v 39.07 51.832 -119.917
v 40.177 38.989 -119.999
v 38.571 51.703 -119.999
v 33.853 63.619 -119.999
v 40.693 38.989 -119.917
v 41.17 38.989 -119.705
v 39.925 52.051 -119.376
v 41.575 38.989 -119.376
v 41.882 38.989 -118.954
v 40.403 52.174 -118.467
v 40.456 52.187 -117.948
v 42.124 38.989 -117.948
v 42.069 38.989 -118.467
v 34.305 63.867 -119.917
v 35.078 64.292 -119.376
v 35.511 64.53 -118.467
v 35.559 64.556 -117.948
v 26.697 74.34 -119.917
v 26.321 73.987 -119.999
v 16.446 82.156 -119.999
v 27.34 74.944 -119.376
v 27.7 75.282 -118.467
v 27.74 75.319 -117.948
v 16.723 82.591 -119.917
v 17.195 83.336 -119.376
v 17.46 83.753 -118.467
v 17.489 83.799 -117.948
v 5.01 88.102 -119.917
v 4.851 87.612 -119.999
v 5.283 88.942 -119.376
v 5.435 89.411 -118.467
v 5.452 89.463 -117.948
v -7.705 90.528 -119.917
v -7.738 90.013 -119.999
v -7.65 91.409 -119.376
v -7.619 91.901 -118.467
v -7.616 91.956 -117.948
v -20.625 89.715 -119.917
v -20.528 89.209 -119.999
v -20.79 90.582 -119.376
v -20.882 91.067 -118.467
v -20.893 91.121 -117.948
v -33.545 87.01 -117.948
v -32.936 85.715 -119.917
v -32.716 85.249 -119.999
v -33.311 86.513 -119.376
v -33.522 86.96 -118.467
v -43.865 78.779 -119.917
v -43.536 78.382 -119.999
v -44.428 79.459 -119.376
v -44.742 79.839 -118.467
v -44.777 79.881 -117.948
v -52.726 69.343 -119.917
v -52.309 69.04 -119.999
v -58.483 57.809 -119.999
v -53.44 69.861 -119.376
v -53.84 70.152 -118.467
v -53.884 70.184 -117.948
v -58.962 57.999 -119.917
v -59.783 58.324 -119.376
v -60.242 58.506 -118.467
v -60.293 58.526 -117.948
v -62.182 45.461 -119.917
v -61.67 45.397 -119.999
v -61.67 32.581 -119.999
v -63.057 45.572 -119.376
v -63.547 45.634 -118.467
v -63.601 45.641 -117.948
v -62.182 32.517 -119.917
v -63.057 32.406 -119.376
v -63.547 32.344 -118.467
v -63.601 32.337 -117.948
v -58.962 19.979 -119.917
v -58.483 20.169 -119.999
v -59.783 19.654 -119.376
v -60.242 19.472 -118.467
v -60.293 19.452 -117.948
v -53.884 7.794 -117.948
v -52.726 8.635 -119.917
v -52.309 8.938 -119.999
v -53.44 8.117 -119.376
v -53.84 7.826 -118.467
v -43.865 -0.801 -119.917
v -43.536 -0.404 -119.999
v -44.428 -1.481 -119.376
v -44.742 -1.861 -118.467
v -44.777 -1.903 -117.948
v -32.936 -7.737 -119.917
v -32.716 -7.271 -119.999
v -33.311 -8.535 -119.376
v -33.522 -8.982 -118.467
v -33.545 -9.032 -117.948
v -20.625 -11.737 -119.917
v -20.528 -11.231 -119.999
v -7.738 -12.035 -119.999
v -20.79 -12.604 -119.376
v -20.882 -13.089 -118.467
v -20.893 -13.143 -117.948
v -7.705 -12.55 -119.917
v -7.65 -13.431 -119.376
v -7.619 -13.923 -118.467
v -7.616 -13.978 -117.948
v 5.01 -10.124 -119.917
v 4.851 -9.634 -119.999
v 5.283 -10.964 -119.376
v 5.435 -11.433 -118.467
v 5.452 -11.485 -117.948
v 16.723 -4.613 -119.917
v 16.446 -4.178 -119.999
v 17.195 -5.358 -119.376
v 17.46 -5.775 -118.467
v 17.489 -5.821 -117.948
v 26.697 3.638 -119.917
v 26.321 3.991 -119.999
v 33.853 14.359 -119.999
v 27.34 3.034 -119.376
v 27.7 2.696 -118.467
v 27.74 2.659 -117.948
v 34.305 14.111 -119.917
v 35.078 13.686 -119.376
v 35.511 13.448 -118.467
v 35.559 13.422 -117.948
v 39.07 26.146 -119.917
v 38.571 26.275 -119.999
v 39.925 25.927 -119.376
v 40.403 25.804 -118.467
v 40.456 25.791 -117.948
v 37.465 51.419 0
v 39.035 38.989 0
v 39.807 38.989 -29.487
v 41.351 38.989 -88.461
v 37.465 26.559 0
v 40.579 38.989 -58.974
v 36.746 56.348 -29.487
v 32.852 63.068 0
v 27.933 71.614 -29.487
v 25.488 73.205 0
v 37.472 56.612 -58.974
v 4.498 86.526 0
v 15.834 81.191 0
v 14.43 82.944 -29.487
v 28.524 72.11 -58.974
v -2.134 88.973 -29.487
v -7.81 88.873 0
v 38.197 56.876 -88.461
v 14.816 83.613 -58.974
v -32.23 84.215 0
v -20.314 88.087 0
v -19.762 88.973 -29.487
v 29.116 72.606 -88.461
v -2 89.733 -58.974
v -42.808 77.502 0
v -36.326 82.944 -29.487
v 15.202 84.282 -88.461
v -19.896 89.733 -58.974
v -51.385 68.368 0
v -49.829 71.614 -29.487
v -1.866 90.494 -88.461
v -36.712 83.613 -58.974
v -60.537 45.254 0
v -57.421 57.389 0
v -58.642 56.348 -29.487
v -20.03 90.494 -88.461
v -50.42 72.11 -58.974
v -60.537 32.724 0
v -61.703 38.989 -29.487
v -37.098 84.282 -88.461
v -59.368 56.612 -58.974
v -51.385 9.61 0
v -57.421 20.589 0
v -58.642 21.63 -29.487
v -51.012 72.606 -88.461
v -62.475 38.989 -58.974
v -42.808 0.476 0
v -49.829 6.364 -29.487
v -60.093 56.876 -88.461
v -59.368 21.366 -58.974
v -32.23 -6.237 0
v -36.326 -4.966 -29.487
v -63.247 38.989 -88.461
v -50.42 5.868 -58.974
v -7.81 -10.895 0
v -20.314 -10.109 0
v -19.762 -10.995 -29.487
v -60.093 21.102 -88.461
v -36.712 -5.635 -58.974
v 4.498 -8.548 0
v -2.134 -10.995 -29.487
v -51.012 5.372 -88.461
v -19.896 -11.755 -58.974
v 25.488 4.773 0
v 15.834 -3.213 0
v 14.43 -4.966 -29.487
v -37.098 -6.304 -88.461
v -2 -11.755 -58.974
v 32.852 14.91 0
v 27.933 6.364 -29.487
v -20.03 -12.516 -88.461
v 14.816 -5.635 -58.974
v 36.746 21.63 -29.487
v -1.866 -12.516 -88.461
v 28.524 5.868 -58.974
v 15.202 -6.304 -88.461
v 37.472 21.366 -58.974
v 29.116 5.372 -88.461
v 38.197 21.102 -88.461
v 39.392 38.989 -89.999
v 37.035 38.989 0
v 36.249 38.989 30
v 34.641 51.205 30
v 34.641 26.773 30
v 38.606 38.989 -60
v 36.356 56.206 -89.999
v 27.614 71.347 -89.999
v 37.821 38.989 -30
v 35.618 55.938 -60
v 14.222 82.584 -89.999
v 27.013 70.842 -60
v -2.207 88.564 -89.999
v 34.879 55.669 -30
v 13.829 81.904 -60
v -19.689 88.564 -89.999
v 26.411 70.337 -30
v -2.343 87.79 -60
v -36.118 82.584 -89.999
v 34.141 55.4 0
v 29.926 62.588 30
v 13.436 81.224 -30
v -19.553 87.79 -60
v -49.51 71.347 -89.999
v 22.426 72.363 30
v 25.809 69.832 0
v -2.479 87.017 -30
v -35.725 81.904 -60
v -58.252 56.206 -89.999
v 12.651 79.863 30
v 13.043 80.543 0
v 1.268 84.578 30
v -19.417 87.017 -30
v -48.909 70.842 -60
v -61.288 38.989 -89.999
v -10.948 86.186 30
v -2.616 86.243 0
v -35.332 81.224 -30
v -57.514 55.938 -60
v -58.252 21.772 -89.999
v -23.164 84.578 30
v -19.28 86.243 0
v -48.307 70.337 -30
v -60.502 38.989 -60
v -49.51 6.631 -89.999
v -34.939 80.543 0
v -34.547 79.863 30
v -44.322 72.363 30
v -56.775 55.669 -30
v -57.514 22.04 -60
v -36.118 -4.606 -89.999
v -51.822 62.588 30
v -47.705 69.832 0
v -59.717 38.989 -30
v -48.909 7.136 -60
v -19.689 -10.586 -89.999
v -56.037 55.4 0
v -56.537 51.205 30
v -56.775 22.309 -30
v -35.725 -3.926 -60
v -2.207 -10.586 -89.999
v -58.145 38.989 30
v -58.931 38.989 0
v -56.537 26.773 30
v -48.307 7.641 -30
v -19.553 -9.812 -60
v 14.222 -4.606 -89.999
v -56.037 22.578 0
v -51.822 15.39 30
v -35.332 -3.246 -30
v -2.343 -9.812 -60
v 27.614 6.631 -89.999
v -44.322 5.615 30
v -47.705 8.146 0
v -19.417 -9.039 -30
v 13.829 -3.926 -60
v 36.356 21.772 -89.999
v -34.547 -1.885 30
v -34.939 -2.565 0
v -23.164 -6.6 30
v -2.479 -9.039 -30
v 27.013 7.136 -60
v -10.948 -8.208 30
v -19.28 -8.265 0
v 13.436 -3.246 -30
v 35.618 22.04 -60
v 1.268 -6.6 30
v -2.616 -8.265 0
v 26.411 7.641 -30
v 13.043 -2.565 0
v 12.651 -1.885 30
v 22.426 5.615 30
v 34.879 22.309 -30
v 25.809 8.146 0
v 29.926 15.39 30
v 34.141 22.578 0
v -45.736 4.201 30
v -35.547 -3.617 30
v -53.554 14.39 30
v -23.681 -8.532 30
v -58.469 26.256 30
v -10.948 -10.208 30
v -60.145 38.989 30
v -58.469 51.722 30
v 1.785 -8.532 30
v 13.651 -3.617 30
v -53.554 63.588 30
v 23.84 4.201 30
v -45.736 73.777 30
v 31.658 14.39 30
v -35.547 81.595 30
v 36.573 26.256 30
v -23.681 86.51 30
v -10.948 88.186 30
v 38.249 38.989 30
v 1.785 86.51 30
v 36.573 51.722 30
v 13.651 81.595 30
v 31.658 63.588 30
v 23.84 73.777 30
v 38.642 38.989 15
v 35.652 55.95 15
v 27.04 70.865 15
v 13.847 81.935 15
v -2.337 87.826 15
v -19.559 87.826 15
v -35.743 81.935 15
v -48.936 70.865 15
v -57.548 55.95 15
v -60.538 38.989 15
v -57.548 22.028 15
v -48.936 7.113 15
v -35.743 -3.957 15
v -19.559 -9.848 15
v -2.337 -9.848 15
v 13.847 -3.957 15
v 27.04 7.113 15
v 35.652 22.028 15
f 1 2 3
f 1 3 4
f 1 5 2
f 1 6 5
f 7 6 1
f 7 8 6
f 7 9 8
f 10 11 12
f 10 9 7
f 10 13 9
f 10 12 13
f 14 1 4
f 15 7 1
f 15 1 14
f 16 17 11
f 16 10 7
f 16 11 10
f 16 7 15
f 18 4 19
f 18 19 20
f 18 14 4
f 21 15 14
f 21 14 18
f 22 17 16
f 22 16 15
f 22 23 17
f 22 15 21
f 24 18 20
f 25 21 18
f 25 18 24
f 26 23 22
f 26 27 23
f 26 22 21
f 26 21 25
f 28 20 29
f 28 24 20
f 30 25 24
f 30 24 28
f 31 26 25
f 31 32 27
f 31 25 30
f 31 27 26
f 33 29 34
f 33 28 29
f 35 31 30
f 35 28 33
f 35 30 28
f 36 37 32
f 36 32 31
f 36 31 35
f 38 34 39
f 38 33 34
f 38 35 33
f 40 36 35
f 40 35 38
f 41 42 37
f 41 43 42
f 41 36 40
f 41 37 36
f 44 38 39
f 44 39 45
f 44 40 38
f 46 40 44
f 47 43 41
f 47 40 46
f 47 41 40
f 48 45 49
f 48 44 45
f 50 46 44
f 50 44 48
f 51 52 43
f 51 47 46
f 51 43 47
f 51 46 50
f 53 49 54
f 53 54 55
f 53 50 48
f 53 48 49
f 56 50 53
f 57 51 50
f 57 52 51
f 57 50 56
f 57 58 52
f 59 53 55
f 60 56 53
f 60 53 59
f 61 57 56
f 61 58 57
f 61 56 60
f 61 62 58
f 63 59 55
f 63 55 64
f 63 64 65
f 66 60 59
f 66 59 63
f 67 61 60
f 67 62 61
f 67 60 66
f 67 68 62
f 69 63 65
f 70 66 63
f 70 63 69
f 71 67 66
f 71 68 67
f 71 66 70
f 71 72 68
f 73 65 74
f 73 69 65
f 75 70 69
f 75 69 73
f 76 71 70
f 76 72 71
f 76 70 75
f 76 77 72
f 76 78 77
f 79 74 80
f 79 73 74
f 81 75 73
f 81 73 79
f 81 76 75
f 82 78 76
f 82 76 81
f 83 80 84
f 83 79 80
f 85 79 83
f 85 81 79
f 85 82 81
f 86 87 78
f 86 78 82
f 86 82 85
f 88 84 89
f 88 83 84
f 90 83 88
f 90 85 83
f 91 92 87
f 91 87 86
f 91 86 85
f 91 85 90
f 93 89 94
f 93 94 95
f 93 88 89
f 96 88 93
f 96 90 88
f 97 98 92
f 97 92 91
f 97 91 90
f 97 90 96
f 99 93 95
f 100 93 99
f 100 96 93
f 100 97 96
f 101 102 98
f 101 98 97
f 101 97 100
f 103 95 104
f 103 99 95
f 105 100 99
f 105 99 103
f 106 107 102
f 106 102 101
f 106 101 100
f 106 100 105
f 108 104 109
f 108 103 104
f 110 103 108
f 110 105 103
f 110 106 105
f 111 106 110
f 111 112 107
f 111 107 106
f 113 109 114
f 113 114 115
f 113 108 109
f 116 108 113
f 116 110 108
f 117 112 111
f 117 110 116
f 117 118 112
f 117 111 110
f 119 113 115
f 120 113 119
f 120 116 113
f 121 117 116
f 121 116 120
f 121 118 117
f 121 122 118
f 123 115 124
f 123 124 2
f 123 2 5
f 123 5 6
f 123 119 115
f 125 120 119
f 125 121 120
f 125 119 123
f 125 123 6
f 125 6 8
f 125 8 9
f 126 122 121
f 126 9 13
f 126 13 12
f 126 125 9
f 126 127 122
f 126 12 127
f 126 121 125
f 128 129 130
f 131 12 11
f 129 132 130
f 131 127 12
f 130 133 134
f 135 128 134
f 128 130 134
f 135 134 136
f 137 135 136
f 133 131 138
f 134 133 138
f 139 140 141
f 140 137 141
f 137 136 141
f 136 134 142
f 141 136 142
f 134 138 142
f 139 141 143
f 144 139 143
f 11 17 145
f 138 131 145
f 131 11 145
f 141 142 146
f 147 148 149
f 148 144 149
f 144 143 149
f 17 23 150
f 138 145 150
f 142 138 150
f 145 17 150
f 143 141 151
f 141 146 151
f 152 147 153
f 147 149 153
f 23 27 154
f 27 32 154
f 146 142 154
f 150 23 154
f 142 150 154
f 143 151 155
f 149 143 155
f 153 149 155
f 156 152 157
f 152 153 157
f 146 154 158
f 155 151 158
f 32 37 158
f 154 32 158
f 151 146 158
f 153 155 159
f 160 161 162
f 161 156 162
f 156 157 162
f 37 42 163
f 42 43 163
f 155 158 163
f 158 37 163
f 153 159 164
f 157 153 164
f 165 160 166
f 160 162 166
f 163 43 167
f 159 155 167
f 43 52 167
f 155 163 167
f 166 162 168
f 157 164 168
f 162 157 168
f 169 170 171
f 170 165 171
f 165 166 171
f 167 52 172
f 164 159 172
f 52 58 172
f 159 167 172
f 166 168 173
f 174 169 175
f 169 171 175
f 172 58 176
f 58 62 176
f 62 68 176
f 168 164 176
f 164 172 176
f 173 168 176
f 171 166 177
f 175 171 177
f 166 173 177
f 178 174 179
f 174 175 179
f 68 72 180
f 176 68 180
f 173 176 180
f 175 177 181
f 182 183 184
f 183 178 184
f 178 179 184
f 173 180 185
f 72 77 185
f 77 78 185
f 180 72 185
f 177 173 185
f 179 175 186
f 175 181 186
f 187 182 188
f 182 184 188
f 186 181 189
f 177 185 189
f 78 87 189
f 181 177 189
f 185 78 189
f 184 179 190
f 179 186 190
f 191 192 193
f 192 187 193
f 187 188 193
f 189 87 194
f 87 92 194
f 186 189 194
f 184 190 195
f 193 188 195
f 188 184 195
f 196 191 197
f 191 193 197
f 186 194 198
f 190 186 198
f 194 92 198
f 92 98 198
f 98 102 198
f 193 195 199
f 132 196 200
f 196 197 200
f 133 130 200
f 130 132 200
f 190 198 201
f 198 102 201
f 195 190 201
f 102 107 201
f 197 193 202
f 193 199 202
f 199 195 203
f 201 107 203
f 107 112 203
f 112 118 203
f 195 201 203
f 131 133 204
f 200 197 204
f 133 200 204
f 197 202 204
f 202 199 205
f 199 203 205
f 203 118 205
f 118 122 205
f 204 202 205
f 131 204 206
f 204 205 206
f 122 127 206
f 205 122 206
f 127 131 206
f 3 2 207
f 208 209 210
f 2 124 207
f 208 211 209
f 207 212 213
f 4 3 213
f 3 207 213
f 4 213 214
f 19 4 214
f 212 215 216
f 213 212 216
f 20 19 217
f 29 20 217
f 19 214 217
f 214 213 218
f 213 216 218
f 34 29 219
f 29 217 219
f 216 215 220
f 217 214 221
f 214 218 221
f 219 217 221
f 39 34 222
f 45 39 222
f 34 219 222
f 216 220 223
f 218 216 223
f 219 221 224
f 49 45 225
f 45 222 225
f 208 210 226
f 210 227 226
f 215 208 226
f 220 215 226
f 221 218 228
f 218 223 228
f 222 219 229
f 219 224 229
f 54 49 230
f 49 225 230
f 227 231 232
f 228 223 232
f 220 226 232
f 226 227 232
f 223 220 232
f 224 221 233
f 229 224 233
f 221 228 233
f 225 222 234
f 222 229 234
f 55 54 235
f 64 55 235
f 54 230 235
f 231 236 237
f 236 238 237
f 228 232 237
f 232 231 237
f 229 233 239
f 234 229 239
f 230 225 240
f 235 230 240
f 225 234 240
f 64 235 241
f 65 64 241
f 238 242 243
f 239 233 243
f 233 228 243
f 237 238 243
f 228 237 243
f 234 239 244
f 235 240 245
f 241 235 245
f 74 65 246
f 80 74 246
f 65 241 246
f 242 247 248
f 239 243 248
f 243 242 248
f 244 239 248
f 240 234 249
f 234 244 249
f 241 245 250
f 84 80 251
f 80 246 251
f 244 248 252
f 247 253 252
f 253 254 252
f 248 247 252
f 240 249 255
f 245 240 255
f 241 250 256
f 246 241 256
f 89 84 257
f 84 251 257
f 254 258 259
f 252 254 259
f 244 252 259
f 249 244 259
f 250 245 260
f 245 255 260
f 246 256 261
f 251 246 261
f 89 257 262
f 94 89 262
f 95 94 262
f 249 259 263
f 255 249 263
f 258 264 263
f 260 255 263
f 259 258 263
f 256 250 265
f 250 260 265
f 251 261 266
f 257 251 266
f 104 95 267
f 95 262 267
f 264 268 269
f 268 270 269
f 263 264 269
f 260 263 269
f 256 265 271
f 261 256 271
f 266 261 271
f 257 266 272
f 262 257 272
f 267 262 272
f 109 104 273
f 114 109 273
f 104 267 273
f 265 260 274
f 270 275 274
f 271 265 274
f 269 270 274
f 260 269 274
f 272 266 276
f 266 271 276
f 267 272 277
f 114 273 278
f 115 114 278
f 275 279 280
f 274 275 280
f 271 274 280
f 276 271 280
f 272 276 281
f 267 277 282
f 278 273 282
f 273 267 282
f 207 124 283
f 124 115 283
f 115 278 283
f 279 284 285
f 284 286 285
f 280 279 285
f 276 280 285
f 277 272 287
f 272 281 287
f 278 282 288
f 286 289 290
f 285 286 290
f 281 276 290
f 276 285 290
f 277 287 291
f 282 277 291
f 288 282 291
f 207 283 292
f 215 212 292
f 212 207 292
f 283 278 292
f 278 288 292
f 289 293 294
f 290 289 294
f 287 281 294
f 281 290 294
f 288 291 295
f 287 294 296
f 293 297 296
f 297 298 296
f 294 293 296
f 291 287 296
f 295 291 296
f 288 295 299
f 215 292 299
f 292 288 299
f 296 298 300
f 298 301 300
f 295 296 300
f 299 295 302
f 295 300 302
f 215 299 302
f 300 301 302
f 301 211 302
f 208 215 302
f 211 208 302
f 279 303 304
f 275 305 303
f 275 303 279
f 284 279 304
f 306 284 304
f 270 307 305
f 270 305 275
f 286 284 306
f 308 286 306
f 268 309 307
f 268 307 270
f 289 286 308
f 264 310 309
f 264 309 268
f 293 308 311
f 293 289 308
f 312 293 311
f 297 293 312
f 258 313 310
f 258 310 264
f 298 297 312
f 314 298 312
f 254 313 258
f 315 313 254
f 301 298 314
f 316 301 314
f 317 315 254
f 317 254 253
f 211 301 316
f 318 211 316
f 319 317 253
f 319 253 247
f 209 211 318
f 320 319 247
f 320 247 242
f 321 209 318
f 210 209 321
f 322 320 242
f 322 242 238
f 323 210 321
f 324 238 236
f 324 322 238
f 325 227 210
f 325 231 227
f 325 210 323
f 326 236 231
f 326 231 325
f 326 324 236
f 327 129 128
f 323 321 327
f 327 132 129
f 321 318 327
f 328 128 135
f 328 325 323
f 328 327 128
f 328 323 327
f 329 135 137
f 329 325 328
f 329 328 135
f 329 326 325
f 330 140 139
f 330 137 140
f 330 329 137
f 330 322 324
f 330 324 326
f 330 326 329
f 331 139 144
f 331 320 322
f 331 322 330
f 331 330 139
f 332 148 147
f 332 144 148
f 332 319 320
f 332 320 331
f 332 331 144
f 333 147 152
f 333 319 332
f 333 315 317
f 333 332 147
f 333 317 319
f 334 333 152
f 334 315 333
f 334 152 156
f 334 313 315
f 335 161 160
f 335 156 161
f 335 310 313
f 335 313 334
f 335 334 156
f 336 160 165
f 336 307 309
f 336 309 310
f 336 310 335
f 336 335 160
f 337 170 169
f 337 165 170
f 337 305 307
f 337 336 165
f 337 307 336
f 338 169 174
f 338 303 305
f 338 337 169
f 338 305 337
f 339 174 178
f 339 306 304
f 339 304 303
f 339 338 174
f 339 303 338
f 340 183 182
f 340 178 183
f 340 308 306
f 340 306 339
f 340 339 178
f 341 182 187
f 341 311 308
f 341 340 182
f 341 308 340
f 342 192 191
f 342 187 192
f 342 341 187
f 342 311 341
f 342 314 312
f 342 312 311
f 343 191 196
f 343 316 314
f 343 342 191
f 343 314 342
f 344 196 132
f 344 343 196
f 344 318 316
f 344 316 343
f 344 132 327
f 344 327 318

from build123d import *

# Parameters (mm, degrees)
SKETCH2_R                 = 49.983
MAIN_PART_DEPTH           = 30
MAIN_PART_TAPER           = 1.5
MAIN_PART_OTHER_WAY_DEPTH = 120
MAIN_PART_OTHER_WAY_TAPER = -1.5
SKETCH3_R                 = 47.197422353
MAINCUT_DEPTH             = 150
MAINCUT_DRAFT             = 1.5
FILLET1_R                 = 2


with BuildPart() as part:
    # Sketch2 → Main part (new body)
    with BuildSketch(Plane.XY):
        with Locations((-10.948, 38.989)):
            Circle(SKETCH2_R)
    extrude(amount=MAIN_PART_DEPTH, taper=MAIN_PART_TAPER)

    # Sketch2 → Main part other way (add)
    with BuildSketch(Plane.XY):
        with Locations((-10.948, 38.989)):
            Circle(SKETCH2_R)
    extrude(amount=-MAIN_PART_OTHER_WAY_DEPTH, taper=MAIN_PART_OTHER_WAY_TAPER)


with BuildPart() as maincut_tool:
    # Sketch3 → MainCut (with draft: the straight prism first)
    with BuildSketch(Plane.XY.offset(30)):
        with Locations((-10.948, 38.989)):
            Circle(SKETCH3_R)
    extrude(amount=-MAINCUT_DEPTH)
    # MainCut: the draft: its side faces are tilted about the plane it starts from
    maincut_sides = [maincut_tool.faces().sort_by_distance(p)[0] for p in [
        (-58.145422353, 38.989, -45),
    ]]
    draft(maincut_sides, Plane.XY.offset(30), MAINCUT_DRAFT)


with BuildPart() as part_1:
    add(part.part)

    # MainCut: cut by maincut_tool
    add(maincut_tool.part, mode=Mode.SUBTRACT)

    # Fillet1
    # the kernel refuses this fillet: 2 mm, written as the material it takes off along each edge
    with BuildSketch(Plane(origin=(-10.948, 38.989, -120), x_dir=(1, 0, 0), z_dir=(0, -1, 0))) as fillet1_piece_1:
        with BuildLine():
            CenterArc((53.125310588 - FILLET1_R * 1.02652871406, FILLET1_R), FILLET1_R, 270, 91.5)
            Line((53.125310588 - FILLET1_R * 1.02652871406, 0), (53.125310588, 0))
            Line((53.125310588, 0), (53.125310588 - FILLET1_R * 0.0268713890845, FILLET1_R * 1.02617694831))
        make_face()
    revolve(axis=Axis((-10.948, 38.989, -120), (0, 0, 1)), mode=Mode.SUBTRACT)


solid = part_1.part
